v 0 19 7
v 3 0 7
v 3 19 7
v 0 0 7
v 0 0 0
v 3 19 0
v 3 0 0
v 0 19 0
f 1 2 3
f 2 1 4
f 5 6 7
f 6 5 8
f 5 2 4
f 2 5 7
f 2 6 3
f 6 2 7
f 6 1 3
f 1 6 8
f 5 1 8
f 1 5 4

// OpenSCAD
// Generated by SolidPython 1.0.1 on 2020-07-29 00:46:54


cube(size = [3, 19, 7]);
/***********************************************
*********      SolidPython code:      **********
************************************************
 
# import packages: SolidPython
from solid import *
from solid.utils import *
from itertools import chain, combinations, permutations


class Resize:

    def __init__(self, scad_file):
        self.scad_file = scad_file
        #self.scad_file = import_scad(scad_file)
        # cone/cylinder param:
        self.r1 = 0
        self.r2 = 0
        self.h = 0
        # rectangular prism param:
        self.w = 0
        self.l = 0
        # ellipse param:
        self.r = 0

    # import OpenScad code (file name corresponds to shape)


    # classify shape + parameters
    def assign(self, param1, param2, param3):
        if self.scad_file == 'cone.scad':
            self.r1 = param1
            self.r2 = param2
            self.h = param3
        elif self.scad_file == 'cylinder.scad':
            self.r1 = param1
            self.r2 = param2
            self.h = param3
        elif self.scad_file == 'rectangularPrism.scad':
            self.h = param1
            self.l = param2
            self.w = param3
        else:
            self.r = param1
            self.h = param2

    # resize parameters
    def iterate(self):
        x = range(3, 20, 2)
        i = 1
        if self.scad_file == 'cone.scad':
            tempList = list(permutations(x, 2))
            for temp in tempList:
                param1 = temp[0]
                param2 = temp[1]
                filepath = 'produced_scad_files/' + 'cone' + str(param1) + '_' + str(param2) + '_' + '.scad'
                scad_render_to_file(cylinder(h=param1, r1=param2, r2=0), filepath)

        elif self.scad_file == 'cylinder.scad':
            tempList = list(permutations(x, 3))
            for temp in tempList:
                param1 = temp[0]
                param2 = temp[1]
                filepath = 'produced_scad_files/' + 'cylinder' + str(param1) + '_' + str(param2) + '_' + '.scad'
                scad_render_to_file(cylinder(h=param1, r1=param2, r2=param2), filepath)

        elif self.scad_file == 'rectangularPrism.scad':
            tempList = list(permutations(x, 3))
            for temp in tempList:
                param1 = temp[0]
                param2 = temp[1]
                param3 = temp[2]
                filepath = 'produced_scad_files/' + 'rectangularPrism' + str(param1) + '_' + str(param2) + '_' + str(
                    param3) + '.scad'
                scad_render_to_file(cube(size=(param1, param2, param3)), filepath)

        elif self.scad_file == 'ellipse.scad':
            tempList = list(permutations(x, 4))
            for temp in tempList:
                param1 = temp[0]
                param2 = temp[1]
                param3 = temp[2]
                param4 = temp[3]
                filepath = 'produced_scad_files/' + 'ellipse' + str(param1) + '_' + str(param2) + '_' + str(param3) + '_' + str(param4) + '.scad'
                scad_render_to_file(scale([param1, param2, param3])(sphere(r=param4)), filepath)

    def render_to_scadfile(self):
        scad_render_to_file(scad, 'example.scad') 
 
************************************************/
